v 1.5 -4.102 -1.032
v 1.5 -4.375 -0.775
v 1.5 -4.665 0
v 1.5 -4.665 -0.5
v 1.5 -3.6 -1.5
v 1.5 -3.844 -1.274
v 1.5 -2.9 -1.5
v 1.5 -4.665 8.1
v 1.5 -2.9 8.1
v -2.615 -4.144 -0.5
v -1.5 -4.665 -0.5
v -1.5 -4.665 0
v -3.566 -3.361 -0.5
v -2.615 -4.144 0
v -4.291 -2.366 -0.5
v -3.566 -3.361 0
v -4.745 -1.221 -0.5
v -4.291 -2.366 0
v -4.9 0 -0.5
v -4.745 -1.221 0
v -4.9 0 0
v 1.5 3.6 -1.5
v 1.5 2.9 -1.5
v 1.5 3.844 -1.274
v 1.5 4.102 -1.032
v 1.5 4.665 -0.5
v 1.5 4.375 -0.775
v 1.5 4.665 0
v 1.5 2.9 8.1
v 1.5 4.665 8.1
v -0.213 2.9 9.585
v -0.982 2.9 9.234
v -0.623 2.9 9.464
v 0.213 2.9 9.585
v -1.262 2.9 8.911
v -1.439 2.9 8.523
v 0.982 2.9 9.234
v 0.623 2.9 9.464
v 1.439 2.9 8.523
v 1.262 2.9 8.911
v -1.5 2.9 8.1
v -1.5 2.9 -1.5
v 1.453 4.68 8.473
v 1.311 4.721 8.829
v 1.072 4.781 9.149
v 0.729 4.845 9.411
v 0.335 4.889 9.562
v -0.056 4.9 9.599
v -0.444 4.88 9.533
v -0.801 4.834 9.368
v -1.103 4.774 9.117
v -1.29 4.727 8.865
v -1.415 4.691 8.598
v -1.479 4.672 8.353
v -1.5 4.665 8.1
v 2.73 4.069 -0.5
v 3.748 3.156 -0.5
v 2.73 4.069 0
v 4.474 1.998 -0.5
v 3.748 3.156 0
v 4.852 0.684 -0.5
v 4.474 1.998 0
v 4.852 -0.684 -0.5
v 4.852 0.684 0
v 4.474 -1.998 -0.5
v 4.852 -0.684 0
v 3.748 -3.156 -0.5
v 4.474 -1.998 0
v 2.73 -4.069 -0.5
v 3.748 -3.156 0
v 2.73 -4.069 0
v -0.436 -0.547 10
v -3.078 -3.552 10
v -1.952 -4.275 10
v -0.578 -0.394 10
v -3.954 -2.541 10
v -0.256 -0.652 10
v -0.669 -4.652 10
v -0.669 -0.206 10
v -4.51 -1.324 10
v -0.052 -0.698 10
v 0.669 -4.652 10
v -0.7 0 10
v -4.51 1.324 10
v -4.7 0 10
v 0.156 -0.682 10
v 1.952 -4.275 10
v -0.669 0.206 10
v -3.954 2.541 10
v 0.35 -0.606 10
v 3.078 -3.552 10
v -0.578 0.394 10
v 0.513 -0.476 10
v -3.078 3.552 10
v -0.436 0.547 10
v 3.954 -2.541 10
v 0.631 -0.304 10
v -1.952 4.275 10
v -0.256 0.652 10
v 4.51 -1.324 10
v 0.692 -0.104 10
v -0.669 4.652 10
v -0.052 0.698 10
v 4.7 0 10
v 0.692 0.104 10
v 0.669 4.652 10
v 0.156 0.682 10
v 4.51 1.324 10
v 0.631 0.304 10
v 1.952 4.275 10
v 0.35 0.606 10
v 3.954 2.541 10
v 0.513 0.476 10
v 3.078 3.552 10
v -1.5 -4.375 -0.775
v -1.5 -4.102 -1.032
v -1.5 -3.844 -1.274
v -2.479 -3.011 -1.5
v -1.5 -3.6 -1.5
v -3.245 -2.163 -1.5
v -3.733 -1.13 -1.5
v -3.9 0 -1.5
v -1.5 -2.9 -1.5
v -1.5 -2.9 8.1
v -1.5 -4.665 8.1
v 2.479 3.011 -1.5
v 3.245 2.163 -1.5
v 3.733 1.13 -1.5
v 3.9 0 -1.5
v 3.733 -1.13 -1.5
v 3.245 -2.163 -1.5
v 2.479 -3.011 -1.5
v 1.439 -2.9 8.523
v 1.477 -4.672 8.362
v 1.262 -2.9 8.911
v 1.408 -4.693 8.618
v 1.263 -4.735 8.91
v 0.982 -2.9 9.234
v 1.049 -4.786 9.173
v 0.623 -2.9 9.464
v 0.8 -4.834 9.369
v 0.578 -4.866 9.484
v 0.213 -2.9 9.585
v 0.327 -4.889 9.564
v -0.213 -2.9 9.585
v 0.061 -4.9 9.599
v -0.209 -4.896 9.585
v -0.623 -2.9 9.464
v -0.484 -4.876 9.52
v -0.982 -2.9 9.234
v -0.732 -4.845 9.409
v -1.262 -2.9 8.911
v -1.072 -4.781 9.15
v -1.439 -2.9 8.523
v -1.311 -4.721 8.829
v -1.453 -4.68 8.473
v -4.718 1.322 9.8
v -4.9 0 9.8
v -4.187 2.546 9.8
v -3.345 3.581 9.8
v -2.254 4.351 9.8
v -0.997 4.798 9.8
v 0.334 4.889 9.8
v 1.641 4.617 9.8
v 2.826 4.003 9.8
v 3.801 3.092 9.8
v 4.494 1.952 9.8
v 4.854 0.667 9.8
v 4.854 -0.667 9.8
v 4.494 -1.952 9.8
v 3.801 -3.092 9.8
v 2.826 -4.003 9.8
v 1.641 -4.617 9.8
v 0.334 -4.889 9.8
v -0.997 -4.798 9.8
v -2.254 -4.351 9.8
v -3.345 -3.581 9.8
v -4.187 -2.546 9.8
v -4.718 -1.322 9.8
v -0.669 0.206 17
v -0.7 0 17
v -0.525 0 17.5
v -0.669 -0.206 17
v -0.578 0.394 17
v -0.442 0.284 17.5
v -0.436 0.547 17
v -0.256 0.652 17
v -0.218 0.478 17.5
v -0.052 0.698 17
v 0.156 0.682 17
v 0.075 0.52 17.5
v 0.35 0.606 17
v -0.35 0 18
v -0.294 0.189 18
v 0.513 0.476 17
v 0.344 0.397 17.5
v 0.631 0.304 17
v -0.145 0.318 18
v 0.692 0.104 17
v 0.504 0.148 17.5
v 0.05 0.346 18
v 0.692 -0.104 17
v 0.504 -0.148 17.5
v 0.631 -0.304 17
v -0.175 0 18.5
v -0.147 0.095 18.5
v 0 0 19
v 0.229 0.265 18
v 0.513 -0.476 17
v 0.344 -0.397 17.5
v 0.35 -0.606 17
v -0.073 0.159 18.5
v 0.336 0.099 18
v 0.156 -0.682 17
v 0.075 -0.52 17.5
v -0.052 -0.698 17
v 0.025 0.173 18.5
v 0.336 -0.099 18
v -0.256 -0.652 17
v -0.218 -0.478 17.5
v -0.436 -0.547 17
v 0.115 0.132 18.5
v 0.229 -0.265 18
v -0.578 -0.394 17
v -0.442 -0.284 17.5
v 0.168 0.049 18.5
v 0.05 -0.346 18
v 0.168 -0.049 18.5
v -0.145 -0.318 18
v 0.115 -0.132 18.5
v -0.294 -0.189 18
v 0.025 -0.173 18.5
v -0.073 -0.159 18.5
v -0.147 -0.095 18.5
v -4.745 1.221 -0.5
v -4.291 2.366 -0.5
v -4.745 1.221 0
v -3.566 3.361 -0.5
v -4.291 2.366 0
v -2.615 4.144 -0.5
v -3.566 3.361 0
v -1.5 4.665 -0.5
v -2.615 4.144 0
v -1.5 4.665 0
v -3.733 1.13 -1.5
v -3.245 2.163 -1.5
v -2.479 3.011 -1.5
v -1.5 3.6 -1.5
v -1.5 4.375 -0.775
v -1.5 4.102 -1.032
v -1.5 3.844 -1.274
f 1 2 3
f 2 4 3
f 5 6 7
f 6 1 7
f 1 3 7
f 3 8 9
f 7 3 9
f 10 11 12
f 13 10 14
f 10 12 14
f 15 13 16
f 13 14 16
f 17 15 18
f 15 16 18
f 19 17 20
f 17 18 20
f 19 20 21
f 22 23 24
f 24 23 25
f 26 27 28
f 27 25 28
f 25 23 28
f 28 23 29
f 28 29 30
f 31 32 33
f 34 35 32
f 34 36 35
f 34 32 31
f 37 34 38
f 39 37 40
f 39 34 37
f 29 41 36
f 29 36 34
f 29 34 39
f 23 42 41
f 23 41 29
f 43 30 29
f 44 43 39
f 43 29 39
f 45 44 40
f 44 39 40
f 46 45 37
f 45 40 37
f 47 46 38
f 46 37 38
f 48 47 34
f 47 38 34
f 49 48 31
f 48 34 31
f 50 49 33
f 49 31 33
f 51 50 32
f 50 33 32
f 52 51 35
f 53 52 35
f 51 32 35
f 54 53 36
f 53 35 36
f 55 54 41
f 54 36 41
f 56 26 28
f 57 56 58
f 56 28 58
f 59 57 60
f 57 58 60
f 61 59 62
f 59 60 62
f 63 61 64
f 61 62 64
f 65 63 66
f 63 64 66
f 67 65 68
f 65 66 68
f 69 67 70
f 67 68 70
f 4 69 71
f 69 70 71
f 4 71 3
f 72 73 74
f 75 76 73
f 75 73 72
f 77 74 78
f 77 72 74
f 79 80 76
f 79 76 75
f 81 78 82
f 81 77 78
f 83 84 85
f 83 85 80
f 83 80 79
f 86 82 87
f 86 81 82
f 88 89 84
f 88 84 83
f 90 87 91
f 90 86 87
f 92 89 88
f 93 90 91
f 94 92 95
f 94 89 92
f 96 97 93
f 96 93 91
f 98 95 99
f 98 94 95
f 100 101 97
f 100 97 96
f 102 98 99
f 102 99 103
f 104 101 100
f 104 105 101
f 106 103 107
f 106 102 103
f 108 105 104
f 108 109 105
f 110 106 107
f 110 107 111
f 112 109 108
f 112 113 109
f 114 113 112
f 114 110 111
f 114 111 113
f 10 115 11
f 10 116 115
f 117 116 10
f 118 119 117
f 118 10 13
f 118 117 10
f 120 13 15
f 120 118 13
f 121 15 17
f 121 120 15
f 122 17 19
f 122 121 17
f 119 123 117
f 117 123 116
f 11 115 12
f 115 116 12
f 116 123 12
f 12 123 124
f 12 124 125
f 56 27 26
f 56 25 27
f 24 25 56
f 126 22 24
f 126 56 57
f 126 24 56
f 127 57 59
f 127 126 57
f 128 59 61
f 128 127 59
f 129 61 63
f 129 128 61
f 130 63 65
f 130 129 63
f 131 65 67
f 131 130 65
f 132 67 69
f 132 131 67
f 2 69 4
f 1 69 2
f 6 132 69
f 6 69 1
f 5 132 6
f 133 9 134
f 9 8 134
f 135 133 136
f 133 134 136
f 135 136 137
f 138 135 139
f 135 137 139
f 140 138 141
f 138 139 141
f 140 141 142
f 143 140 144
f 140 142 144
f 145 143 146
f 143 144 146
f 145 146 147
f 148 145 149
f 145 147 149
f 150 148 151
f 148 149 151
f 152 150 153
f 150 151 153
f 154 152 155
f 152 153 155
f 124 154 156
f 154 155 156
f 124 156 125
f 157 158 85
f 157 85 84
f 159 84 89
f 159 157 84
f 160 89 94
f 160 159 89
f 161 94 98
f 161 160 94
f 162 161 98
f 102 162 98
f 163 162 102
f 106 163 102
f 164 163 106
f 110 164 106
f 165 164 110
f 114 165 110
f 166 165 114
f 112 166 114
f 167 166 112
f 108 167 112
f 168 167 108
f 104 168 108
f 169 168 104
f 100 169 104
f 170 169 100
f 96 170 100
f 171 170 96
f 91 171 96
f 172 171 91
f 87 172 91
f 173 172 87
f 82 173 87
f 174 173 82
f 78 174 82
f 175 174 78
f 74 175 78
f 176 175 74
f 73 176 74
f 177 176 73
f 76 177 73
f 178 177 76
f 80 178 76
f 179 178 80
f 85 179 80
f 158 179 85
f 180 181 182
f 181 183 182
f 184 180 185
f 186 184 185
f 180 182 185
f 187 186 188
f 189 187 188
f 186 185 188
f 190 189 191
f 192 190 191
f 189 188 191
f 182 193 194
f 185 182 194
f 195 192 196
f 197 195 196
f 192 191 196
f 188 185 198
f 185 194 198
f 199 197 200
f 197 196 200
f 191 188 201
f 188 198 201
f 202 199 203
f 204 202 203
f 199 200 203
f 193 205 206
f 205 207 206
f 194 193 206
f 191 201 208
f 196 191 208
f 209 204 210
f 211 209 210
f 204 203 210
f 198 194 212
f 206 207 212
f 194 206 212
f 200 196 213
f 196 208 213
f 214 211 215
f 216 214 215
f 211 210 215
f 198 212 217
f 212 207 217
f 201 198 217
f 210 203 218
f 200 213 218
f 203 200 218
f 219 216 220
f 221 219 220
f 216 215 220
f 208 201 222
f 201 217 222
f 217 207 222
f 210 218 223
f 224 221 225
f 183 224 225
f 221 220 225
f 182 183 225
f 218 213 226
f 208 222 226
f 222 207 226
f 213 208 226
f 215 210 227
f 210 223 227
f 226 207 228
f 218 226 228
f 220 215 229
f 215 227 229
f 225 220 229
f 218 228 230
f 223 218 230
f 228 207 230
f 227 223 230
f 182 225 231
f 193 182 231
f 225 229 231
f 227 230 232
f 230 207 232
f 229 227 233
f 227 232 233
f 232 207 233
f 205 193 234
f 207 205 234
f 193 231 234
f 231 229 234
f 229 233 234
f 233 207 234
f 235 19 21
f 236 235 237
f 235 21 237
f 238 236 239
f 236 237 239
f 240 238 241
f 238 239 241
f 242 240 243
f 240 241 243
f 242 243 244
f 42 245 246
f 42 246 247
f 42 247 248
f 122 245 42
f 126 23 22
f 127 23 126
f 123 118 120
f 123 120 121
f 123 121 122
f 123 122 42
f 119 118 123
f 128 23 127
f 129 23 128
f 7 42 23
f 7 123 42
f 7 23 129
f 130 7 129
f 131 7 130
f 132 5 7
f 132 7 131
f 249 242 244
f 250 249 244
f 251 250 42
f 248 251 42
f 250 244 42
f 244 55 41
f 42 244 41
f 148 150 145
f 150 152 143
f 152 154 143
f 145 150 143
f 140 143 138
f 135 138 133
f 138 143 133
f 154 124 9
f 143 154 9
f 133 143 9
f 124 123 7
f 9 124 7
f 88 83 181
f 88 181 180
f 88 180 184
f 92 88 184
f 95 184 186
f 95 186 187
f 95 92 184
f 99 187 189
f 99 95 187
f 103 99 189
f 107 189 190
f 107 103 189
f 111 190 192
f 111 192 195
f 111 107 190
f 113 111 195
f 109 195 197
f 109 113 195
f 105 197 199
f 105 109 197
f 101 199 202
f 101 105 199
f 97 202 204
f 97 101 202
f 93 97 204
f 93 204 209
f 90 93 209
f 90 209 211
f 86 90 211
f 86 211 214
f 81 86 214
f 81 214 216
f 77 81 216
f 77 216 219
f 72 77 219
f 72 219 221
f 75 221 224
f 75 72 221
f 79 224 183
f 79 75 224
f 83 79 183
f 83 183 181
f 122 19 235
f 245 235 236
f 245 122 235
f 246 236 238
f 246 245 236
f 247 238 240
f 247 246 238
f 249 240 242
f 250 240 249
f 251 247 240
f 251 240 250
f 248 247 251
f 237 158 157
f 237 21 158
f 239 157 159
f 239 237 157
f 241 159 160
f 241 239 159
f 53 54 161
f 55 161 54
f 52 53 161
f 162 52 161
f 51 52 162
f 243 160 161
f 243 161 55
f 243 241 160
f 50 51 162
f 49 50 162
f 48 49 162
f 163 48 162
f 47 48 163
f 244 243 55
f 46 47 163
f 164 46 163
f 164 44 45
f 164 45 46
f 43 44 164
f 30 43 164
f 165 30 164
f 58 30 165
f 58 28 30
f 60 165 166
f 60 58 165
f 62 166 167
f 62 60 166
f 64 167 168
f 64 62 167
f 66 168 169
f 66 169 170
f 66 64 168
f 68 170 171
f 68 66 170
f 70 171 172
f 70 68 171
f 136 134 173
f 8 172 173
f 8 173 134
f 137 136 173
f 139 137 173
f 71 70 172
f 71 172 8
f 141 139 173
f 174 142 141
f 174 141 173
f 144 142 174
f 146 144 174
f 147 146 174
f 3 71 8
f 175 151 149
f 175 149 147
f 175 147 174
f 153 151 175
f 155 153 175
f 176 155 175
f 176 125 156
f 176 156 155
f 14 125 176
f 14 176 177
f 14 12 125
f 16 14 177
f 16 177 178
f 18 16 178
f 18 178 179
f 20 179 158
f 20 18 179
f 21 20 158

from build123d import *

# Parameters (mm, degrees)
F3_START = -2
F3_DEPTH = 23
F4_DEPTH = 25
F5_DEPTH = 1.5
F6_SIZE  = 1
F7_SIZE2 = 0.7
F7_SIZE  = 2
F8_SIZE  = 0.2
F9_DEPTH = 25
F10_W    = 4.5
F10_H    = 5.8


with BuildPart() as f1:
    # F0 (on Front) → F1 (revolve)
    with BuildSketch(Plane.XZ):
        Polygon((-4.9, 9), (-4.9, 0), (0, 0), (0, 19), (-0.7, 19), (-0.7, 10), (-4.9, 10), align=None)
    revolve(axis=Axis((0, 0, 9.5), (0, 0, -1)))

    # F2 (on Front) → F3 (cut)
    with BuildSketch(Plane.XZ.offset(F3_START)):
        with BuildLine():
            Line((1.5, 0), (1.5, 8.1))
            ThreePointArc((1.5, 8.1), (0, 9.6), (-1.5, 8.1))
            Line((-1.5, 8.1), (-1.5, 0))
            Line((-1.5, 0), (1.5, 0))
        make_face()
    extrude(amount=-F3_DEPTH, mode=Mode.SUBTRACT)

    # F2 (on Front) → F4 (cut)
    with BuildSketch(Plane.XZ):
        with BuildLine():
            Line((1.5, 0), (1.5, 8.1))
            ThreePointArc((1.5, 8.1), (0, 9.6), (-1.5, 8.1))
            Line((-1.5, 8.1), (-1.5, 0))
            Line((-1.5, 0), (1.5, 0))
        make_face()
    extrude(amount=-F4_DEPTH, mode=Mode.SUBTRACT)

    # F1_face (on face) → F5 (join)
    with BuildSketch(Plane(origin=(0, -0.5723183731, 0), x_dir=(1, 0, 0), z_dir=(0, 0, -1))):
        with BuildLine():
            Line((1.5, -0.5723183731), (1.5, -5.237079889))
            ThreePointArc((1.5, -5.237079889), (2.8861739379, 3.3874796015), (-4.9, -0.5723183731))
            ThreePointArc((-4.9, -0.5723183731), (-3.9597979746, -3.458492311), (-1.5, -5.237079889))
            Line((-1.5, -5.237079889), (-1.5, -0.5723183731))
            Line((-1.5, -0.5723183731), (1.5, -0.5723183731))
        make_face()
    extrude(amount=F5_DEPTH)

    # F6
    f6_edges = [f1.edges().sort_by_distance(p)[0] for p in [
        (-4.9, 0, 4.25),
        (2.886174, -3.959798, -1.5),
        (-3.959798, 2.886174, -1.5),
    ]]
    chamfer(f6_edges, length=F6_SIZE)

    # F7
    f7_edges = [f1.edges().sort_by_distance(p)[0] for p in [
        (0.7, 0, 19),
    ]]
    f7_side = f1.faces().sort_by_distance((0.7, 0, 14.5))[0]
    chamfer(f7_edges, length=F7_SIZE, length2=F7_SIZE2, reference=f7_side)

    # F8
    f8_edges = [f1.edges().sort_by_distance(p)[0] for p in [
        (4.9, 0, 10),
    ]]
    chamfer(f8_edges, length=F8_SIZE)

    # F5_face (on face) → F9 (cut)
    with BuildSketch(Plane(origin=(0, 0, 3.8942483753), x_dir=(-1, 0, 0), z_dir=(0, 1, 0))):
        with BuildLine():
            ThreePointArc((1.5, 4.2057516247), (0, 5.7057516247), (-1.5, 4.2057516247))
            Line((-1.5, 4.2057516247), (-1.5, -5.3942483753))
            Line((-1.5, -5.3942483753), (1.5, -5.3942483753))
            Line((1.5, -5.3942483753), (1.5, 4.2057516247))
        make_face()
    extrude(amount=-F9_DEPTH, mode=Mode.SUBTRACT)

    # F10 (on face) → F11 (join, up to the next surface of F1)
    with BuildSketch(Plane(origin=(0, 0, -1.5), x_dir=(1, 0, 0), z_dir=(0, 0, -1))):
        Rectangle(F10_W, F10_H)
    extrude(until=Until.NEXT, dir=(0, 0, 1))


solid = f1.part
